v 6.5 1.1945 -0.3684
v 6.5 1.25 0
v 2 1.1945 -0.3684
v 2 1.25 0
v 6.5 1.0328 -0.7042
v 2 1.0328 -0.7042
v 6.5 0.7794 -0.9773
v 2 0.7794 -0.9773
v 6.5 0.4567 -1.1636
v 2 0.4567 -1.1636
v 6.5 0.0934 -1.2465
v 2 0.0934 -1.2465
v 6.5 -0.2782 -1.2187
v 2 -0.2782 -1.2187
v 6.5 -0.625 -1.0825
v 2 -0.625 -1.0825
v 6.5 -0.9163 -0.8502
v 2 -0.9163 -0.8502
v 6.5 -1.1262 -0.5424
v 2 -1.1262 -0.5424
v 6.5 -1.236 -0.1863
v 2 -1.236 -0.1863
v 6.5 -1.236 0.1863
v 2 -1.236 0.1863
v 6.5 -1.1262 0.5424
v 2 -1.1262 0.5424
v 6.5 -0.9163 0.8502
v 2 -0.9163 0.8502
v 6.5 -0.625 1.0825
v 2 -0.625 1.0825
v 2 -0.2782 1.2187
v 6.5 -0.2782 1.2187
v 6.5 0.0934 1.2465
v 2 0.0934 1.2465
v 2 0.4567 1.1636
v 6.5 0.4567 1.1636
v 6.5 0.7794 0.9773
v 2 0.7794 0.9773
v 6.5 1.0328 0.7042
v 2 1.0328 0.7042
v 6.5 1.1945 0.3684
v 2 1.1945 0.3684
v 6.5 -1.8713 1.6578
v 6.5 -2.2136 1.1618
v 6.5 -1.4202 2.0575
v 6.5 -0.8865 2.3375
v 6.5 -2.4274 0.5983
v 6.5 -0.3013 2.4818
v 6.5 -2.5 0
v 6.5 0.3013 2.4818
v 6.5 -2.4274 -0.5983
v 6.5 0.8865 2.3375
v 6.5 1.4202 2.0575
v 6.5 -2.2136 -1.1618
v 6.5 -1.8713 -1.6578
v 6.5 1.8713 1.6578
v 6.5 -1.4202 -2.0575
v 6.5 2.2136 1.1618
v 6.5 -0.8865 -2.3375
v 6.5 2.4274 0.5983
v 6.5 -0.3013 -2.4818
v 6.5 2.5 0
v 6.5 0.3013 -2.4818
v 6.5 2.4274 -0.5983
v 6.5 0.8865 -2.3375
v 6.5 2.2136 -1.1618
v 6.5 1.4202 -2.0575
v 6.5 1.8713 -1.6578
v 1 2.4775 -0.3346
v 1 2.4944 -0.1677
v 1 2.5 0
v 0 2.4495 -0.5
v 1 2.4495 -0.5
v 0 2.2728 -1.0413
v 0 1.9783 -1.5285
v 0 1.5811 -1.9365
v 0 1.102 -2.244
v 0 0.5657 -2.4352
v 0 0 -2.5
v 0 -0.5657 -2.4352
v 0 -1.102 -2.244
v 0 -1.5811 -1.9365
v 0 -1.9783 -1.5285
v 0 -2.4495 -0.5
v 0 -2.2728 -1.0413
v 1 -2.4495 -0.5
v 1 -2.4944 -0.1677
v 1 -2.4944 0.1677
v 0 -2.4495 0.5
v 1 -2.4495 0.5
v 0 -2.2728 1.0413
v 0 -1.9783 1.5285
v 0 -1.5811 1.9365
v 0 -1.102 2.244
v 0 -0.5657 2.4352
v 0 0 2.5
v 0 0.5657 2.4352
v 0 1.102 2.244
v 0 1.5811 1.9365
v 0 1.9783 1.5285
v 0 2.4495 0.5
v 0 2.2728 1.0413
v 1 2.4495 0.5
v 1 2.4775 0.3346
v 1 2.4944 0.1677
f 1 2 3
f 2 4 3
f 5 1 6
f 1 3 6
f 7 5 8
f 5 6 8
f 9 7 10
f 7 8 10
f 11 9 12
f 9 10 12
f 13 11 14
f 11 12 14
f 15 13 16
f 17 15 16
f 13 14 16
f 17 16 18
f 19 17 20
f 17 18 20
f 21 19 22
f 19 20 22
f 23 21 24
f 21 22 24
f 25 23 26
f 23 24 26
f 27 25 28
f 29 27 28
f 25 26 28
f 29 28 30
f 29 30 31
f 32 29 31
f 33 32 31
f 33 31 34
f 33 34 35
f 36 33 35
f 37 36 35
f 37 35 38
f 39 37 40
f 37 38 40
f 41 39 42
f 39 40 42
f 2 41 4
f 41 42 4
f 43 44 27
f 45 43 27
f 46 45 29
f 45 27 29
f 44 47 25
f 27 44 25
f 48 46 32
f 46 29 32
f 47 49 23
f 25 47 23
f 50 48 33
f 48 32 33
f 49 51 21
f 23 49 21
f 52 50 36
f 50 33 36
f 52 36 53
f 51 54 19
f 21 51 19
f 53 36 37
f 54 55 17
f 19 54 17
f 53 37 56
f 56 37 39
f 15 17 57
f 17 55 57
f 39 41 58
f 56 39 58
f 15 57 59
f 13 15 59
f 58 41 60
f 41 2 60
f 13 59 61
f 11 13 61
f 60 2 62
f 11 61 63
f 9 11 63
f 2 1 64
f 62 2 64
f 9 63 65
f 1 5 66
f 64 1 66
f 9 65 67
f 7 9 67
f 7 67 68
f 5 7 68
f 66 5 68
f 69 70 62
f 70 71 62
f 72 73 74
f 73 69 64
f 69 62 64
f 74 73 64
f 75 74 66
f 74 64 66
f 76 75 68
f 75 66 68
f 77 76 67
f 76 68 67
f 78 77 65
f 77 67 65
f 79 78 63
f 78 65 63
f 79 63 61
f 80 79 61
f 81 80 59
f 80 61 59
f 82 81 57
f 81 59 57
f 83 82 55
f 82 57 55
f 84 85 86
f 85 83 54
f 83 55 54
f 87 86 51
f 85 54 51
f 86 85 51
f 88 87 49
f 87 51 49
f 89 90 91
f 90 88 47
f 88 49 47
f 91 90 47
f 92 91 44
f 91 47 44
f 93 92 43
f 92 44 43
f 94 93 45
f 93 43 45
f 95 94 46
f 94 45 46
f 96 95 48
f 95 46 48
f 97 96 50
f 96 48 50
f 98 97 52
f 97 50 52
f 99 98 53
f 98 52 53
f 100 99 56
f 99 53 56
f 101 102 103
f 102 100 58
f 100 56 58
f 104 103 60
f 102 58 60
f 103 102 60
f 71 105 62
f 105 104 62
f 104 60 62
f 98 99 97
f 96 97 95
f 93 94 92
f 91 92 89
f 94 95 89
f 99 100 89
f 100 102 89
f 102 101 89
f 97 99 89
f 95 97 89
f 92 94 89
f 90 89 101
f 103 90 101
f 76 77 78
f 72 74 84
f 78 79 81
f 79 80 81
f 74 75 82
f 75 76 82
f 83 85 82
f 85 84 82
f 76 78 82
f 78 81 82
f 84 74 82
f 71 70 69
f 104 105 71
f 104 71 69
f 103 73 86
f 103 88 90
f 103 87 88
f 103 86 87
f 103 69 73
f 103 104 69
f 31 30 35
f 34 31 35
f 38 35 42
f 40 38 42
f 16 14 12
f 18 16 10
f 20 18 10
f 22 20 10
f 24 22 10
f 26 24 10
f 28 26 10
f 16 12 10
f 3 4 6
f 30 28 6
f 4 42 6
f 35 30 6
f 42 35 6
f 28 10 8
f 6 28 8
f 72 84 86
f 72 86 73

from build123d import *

# Parameters (mm, degrees)
SKETCH2_W          = 1
SKETCH2_H          = 5
CUT_EXTRUDE1_DEPTH = 1


with BuildPart() as part:
    # Sketch1 → Revolve1 (revolve)
    with BuildSketch(Plane.XY):
        Polygon((0, 0), (0, 2.5), (6.5, 2.5), (6.5, 1.25), (2, 1.25), (2, 0), align=None)
    revolve(axis=Axis((2, 0, 0), (-1, 0, 0)))

    # Sketch2 → Cut-Extrude1 (cut)
    with BuildSketch(Plane.ZY):
        Rectangle(SKETCH2_W, SKETCH2_H)
    extrude(amount=-CUT_EXTRUDE1_DEPTH, mode=Mode.SUBTRACT)


solid = part.part
